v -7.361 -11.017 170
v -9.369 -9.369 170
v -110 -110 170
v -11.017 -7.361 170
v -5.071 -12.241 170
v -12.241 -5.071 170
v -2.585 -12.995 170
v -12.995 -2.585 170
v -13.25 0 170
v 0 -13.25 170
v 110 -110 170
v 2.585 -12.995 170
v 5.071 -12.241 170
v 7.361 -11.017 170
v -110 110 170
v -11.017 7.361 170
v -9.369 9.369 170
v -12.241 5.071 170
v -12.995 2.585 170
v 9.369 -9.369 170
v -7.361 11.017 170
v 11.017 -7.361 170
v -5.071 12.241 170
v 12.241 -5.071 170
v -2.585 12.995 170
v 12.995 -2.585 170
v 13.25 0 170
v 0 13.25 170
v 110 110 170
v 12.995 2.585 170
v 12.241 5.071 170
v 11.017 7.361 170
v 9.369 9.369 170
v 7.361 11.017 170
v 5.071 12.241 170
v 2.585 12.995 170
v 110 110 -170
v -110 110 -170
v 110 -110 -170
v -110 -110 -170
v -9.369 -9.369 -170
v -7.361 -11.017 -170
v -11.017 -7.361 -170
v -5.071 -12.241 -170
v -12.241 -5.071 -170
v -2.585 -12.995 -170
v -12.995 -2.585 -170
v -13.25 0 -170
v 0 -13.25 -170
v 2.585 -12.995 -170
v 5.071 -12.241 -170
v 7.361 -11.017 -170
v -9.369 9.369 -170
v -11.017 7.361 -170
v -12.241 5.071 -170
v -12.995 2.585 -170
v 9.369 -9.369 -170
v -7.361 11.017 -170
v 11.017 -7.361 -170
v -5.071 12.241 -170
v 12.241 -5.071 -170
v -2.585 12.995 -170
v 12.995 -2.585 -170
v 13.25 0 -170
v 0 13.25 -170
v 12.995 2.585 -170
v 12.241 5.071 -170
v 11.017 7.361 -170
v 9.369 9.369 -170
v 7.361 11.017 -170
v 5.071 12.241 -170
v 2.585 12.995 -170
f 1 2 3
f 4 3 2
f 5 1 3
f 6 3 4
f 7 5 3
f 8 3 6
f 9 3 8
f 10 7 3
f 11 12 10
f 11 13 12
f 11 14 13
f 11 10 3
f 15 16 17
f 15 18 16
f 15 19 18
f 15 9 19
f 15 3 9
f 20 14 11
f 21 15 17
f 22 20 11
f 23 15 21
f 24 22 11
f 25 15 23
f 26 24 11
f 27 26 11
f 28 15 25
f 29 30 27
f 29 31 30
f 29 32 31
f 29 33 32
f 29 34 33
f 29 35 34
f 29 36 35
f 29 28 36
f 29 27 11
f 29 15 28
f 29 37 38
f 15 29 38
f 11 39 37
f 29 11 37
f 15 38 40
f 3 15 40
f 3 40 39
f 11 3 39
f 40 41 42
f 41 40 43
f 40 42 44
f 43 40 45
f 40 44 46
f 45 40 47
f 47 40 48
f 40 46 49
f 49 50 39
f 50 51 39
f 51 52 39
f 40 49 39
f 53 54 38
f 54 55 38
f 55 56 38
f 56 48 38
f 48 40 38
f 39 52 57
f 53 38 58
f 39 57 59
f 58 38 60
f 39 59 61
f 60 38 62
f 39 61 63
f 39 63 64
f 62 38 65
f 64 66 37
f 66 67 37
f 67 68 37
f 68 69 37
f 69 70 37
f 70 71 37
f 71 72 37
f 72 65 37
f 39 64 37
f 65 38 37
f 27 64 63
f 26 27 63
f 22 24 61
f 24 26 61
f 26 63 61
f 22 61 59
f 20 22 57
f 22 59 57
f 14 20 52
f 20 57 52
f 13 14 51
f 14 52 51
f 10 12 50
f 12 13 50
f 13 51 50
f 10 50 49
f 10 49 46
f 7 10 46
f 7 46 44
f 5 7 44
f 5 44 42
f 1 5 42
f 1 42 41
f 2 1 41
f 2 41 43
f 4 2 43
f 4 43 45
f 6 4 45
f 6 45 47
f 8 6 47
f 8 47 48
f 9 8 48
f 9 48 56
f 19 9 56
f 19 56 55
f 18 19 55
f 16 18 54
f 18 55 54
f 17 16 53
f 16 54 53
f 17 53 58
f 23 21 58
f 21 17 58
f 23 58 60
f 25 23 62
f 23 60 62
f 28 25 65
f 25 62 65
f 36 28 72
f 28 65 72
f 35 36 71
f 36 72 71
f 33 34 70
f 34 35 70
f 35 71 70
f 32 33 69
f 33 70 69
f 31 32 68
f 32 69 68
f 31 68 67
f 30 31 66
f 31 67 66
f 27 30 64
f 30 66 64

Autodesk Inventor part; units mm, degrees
ref_plane "YZ Plane" through (0, 0, 0) normal (1, 0, 0) x (0, 1, 0)
ref_plane "XZ Plane" through (0, 0, 0) normal (0, 1, 0) x (-1, 0, 0)
ref_plane "XY Plane" through (0, 0, 0) normal (0, 0, 1) x (1, 0, 0)
sketch "草圖5" plane through (0, 0, 0) normal (0, 0, 1) x (1, 0, 0)
  line L0 (-110, -110) -> (110, -110)
  line L1 (110, -110) -> (110, 110)
  line L2 (110, 110) -> (-110, 110)
  line L3 (-110, 110) -> (-110, -110)
  line L4 (-110, -110) -> (110, 110) construction
  line L5 (110, -110) -> (-110, 110) construction
  circle A0 centre (0, 0) radius 13.25
  dimension "d29" = 220
  dimension "d30" = 220
  dimension "d33" = 26.5
extrude "擠出6" add sketch "草圖5" along normal mid plane 340
equation "\"th6\" = T1A_th6"
equation "\"T1A_th6\" = 45deg"
equation "\"T1A_R1\" = 585.5331"
equation "\"T1A_R3\" = 252.3048"
equation "\"T1A_R4\" = 320.6953"
equation "\"T1A_R5\" = 419.3047"
equation "\"T1A_R7\" = -221.7475"
equation "\"T1A_R8\" = 369.2781"
equation "\"T1A_R1_Width\" = 756"
equation "\"T1A_R2_Width\" = 756"
equation "\"T1A_R3_Width\" = 344"
equation "\"T1A_R4_Width\" = 756"
equation "\"T1A_Joint_Width\" = 756"
properties part number "Type 1A R6主滑台:1" material "密度7850的鋼"
